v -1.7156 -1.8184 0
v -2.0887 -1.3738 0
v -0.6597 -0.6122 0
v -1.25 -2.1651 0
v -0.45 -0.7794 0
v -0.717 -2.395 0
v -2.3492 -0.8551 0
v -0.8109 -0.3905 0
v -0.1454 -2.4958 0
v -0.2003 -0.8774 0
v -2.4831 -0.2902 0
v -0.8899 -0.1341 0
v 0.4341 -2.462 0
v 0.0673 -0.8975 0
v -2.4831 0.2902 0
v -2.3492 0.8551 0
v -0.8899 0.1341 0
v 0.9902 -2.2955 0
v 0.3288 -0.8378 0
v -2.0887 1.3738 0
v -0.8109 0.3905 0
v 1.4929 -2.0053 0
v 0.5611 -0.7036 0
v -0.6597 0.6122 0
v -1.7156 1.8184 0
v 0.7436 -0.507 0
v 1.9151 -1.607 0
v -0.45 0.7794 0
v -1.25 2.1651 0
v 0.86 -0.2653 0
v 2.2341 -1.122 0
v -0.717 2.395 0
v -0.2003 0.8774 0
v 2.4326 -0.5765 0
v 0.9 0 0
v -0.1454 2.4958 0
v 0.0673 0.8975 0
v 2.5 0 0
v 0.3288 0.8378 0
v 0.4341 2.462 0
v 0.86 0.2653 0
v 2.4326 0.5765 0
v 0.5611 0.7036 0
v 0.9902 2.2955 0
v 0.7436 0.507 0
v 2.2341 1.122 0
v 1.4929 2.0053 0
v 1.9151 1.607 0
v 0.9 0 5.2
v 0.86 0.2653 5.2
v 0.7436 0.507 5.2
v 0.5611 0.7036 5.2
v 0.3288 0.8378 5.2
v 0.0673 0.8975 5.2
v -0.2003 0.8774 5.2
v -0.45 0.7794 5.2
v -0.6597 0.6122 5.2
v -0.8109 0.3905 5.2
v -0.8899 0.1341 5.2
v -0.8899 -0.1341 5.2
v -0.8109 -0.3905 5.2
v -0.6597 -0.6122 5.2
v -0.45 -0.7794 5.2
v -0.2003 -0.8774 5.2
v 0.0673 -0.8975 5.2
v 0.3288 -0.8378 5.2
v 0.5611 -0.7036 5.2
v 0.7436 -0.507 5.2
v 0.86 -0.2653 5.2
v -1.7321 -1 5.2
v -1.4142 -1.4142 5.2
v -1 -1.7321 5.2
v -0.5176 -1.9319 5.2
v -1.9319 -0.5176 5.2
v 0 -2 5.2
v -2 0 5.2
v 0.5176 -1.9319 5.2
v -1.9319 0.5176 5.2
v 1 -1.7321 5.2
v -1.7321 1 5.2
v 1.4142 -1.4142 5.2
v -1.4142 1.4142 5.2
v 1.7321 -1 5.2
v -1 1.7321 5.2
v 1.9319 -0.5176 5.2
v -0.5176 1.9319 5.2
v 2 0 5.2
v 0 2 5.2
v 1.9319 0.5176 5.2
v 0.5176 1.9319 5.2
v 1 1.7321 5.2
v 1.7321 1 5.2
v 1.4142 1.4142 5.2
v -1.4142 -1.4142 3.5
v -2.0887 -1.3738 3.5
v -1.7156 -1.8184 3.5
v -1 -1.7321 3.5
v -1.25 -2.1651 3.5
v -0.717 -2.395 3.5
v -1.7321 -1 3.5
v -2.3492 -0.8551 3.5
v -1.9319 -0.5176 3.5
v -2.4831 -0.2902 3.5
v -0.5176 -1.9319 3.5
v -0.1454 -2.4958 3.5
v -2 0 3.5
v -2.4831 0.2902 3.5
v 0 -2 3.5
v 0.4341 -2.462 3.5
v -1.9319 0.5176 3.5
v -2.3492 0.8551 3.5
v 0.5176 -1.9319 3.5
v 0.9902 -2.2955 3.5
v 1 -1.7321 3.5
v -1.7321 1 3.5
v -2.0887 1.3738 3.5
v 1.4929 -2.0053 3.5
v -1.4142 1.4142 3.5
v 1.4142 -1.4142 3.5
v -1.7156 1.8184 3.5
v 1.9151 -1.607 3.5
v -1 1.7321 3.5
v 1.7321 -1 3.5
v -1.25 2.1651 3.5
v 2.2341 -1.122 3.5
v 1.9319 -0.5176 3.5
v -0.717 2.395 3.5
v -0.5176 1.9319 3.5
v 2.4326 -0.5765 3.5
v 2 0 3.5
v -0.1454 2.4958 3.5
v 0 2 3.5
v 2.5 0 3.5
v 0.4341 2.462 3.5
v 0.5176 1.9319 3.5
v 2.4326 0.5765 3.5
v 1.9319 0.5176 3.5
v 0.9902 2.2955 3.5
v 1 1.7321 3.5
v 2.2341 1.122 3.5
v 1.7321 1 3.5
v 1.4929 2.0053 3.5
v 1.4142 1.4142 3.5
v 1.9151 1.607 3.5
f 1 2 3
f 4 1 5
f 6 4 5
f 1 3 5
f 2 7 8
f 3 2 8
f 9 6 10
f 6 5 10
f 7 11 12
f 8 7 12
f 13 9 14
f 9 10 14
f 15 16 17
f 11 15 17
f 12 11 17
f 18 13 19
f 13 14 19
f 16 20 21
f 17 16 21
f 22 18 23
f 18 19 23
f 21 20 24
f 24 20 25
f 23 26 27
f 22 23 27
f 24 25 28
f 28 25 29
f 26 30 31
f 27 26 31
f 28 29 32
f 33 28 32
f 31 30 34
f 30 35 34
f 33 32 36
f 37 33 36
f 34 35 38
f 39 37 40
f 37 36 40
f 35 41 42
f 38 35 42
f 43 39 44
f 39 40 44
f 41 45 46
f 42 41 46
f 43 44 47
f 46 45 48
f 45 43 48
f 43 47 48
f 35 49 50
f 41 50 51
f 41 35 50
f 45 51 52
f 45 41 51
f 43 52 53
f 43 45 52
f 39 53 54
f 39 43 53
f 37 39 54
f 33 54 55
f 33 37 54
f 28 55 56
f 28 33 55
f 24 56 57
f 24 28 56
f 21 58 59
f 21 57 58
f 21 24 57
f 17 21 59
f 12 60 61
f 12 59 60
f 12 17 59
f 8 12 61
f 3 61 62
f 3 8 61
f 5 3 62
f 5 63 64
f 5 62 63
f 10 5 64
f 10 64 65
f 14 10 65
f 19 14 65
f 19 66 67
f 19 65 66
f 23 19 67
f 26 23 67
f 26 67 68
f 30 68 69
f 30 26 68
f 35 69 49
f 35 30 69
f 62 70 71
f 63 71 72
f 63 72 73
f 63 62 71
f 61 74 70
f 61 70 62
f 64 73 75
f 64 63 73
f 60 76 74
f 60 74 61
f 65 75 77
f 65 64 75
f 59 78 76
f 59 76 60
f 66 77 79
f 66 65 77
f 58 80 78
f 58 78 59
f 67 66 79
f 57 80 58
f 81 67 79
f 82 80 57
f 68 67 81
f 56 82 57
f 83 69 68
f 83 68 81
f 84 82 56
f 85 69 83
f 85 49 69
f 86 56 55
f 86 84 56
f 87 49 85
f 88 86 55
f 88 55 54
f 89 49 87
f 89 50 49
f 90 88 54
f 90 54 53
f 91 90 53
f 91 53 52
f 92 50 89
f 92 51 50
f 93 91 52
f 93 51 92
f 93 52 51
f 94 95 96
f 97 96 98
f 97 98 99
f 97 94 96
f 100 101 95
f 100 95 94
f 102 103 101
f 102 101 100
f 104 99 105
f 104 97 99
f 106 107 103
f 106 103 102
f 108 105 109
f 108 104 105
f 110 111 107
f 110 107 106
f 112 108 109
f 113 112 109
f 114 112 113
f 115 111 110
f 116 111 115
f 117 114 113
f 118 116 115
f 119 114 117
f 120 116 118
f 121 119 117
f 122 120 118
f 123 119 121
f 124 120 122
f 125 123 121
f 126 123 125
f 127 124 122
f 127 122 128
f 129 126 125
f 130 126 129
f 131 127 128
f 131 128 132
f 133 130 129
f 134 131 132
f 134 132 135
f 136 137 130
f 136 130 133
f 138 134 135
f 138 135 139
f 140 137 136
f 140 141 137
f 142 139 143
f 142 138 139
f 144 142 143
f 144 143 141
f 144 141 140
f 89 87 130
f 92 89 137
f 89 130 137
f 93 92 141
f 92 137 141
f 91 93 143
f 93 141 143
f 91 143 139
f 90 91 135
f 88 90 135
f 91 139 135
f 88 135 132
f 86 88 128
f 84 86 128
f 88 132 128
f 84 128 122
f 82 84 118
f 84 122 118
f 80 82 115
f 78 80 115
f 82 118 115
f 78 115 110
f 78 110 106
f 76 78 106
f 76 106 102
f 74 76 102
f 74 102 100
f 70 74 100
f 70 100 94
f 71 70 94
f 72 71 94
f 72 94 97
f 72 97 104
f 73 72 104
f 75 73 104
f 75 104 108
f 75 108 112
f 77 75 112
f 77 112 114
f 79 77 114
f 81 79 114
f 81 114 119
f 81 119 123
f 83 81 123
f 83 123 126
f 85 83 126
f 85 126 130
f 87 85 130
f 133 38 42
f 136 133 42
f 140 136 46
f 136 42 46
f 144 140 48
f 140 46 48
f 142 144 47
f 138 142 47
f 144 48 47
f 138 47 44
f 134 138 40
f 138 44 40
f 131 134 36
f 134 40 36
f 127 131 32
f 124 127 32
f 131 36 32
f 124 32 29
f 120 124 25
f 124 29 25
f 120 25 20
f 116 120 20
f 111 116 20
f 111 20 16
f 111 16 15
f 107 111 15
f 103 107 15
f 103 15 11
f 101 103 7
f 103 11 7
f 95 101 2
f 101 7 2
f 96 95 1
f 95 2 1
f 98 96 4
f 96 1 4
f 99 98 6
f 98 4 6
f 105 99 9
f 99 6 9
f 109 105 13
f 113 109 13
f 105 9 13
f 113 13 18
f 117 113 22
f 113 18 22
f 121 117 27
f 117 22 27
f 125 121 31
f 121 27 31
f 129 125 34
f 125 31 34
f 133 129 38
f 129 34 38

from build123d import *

# Parameters (mm, degrees)
CYLINDER002_R     = 0.9
CYLINDER002_DEPTH = 10
CYLINDER_R        = 2.5
CYLINDER_DEPTH    = 3.5
CYLINDER001_R     = 2
CYLINDER001_DEPTH = 5.2


with BuildPart() as cylinder002:
    # Cylinder002 → Cylinder002 (new body)
    with BuildSketch(Plane.XY):
        Circle(CYLINDER002_R)
    extrude(amount=CYLINDER002_DEPTH)


with BuildPart() as cylinder:
    # Cylinder → Cylinder (new body)
    with BuildSketch(Plane.XY):
        Circle(CYLINDER_R)
    extrude(amount=CYLINDER_DEPTH)


with BuildPart() as markor4mmod_m2:
    # Cylinder001 → Cylinder001 (new body)
    with BuildSketch(Plane.XY):
        Circle(CYLINDER001_R)
    extrude(amount=CYLINDER001_DEPTH)

    # Fusion: union Cylinder
    add(cylinder.part)

    # Cut: cut Cylinder002
    add(cylinder002.part, mode=Mode.SUBTRACT)


solid = markor4mmod_m2.part
